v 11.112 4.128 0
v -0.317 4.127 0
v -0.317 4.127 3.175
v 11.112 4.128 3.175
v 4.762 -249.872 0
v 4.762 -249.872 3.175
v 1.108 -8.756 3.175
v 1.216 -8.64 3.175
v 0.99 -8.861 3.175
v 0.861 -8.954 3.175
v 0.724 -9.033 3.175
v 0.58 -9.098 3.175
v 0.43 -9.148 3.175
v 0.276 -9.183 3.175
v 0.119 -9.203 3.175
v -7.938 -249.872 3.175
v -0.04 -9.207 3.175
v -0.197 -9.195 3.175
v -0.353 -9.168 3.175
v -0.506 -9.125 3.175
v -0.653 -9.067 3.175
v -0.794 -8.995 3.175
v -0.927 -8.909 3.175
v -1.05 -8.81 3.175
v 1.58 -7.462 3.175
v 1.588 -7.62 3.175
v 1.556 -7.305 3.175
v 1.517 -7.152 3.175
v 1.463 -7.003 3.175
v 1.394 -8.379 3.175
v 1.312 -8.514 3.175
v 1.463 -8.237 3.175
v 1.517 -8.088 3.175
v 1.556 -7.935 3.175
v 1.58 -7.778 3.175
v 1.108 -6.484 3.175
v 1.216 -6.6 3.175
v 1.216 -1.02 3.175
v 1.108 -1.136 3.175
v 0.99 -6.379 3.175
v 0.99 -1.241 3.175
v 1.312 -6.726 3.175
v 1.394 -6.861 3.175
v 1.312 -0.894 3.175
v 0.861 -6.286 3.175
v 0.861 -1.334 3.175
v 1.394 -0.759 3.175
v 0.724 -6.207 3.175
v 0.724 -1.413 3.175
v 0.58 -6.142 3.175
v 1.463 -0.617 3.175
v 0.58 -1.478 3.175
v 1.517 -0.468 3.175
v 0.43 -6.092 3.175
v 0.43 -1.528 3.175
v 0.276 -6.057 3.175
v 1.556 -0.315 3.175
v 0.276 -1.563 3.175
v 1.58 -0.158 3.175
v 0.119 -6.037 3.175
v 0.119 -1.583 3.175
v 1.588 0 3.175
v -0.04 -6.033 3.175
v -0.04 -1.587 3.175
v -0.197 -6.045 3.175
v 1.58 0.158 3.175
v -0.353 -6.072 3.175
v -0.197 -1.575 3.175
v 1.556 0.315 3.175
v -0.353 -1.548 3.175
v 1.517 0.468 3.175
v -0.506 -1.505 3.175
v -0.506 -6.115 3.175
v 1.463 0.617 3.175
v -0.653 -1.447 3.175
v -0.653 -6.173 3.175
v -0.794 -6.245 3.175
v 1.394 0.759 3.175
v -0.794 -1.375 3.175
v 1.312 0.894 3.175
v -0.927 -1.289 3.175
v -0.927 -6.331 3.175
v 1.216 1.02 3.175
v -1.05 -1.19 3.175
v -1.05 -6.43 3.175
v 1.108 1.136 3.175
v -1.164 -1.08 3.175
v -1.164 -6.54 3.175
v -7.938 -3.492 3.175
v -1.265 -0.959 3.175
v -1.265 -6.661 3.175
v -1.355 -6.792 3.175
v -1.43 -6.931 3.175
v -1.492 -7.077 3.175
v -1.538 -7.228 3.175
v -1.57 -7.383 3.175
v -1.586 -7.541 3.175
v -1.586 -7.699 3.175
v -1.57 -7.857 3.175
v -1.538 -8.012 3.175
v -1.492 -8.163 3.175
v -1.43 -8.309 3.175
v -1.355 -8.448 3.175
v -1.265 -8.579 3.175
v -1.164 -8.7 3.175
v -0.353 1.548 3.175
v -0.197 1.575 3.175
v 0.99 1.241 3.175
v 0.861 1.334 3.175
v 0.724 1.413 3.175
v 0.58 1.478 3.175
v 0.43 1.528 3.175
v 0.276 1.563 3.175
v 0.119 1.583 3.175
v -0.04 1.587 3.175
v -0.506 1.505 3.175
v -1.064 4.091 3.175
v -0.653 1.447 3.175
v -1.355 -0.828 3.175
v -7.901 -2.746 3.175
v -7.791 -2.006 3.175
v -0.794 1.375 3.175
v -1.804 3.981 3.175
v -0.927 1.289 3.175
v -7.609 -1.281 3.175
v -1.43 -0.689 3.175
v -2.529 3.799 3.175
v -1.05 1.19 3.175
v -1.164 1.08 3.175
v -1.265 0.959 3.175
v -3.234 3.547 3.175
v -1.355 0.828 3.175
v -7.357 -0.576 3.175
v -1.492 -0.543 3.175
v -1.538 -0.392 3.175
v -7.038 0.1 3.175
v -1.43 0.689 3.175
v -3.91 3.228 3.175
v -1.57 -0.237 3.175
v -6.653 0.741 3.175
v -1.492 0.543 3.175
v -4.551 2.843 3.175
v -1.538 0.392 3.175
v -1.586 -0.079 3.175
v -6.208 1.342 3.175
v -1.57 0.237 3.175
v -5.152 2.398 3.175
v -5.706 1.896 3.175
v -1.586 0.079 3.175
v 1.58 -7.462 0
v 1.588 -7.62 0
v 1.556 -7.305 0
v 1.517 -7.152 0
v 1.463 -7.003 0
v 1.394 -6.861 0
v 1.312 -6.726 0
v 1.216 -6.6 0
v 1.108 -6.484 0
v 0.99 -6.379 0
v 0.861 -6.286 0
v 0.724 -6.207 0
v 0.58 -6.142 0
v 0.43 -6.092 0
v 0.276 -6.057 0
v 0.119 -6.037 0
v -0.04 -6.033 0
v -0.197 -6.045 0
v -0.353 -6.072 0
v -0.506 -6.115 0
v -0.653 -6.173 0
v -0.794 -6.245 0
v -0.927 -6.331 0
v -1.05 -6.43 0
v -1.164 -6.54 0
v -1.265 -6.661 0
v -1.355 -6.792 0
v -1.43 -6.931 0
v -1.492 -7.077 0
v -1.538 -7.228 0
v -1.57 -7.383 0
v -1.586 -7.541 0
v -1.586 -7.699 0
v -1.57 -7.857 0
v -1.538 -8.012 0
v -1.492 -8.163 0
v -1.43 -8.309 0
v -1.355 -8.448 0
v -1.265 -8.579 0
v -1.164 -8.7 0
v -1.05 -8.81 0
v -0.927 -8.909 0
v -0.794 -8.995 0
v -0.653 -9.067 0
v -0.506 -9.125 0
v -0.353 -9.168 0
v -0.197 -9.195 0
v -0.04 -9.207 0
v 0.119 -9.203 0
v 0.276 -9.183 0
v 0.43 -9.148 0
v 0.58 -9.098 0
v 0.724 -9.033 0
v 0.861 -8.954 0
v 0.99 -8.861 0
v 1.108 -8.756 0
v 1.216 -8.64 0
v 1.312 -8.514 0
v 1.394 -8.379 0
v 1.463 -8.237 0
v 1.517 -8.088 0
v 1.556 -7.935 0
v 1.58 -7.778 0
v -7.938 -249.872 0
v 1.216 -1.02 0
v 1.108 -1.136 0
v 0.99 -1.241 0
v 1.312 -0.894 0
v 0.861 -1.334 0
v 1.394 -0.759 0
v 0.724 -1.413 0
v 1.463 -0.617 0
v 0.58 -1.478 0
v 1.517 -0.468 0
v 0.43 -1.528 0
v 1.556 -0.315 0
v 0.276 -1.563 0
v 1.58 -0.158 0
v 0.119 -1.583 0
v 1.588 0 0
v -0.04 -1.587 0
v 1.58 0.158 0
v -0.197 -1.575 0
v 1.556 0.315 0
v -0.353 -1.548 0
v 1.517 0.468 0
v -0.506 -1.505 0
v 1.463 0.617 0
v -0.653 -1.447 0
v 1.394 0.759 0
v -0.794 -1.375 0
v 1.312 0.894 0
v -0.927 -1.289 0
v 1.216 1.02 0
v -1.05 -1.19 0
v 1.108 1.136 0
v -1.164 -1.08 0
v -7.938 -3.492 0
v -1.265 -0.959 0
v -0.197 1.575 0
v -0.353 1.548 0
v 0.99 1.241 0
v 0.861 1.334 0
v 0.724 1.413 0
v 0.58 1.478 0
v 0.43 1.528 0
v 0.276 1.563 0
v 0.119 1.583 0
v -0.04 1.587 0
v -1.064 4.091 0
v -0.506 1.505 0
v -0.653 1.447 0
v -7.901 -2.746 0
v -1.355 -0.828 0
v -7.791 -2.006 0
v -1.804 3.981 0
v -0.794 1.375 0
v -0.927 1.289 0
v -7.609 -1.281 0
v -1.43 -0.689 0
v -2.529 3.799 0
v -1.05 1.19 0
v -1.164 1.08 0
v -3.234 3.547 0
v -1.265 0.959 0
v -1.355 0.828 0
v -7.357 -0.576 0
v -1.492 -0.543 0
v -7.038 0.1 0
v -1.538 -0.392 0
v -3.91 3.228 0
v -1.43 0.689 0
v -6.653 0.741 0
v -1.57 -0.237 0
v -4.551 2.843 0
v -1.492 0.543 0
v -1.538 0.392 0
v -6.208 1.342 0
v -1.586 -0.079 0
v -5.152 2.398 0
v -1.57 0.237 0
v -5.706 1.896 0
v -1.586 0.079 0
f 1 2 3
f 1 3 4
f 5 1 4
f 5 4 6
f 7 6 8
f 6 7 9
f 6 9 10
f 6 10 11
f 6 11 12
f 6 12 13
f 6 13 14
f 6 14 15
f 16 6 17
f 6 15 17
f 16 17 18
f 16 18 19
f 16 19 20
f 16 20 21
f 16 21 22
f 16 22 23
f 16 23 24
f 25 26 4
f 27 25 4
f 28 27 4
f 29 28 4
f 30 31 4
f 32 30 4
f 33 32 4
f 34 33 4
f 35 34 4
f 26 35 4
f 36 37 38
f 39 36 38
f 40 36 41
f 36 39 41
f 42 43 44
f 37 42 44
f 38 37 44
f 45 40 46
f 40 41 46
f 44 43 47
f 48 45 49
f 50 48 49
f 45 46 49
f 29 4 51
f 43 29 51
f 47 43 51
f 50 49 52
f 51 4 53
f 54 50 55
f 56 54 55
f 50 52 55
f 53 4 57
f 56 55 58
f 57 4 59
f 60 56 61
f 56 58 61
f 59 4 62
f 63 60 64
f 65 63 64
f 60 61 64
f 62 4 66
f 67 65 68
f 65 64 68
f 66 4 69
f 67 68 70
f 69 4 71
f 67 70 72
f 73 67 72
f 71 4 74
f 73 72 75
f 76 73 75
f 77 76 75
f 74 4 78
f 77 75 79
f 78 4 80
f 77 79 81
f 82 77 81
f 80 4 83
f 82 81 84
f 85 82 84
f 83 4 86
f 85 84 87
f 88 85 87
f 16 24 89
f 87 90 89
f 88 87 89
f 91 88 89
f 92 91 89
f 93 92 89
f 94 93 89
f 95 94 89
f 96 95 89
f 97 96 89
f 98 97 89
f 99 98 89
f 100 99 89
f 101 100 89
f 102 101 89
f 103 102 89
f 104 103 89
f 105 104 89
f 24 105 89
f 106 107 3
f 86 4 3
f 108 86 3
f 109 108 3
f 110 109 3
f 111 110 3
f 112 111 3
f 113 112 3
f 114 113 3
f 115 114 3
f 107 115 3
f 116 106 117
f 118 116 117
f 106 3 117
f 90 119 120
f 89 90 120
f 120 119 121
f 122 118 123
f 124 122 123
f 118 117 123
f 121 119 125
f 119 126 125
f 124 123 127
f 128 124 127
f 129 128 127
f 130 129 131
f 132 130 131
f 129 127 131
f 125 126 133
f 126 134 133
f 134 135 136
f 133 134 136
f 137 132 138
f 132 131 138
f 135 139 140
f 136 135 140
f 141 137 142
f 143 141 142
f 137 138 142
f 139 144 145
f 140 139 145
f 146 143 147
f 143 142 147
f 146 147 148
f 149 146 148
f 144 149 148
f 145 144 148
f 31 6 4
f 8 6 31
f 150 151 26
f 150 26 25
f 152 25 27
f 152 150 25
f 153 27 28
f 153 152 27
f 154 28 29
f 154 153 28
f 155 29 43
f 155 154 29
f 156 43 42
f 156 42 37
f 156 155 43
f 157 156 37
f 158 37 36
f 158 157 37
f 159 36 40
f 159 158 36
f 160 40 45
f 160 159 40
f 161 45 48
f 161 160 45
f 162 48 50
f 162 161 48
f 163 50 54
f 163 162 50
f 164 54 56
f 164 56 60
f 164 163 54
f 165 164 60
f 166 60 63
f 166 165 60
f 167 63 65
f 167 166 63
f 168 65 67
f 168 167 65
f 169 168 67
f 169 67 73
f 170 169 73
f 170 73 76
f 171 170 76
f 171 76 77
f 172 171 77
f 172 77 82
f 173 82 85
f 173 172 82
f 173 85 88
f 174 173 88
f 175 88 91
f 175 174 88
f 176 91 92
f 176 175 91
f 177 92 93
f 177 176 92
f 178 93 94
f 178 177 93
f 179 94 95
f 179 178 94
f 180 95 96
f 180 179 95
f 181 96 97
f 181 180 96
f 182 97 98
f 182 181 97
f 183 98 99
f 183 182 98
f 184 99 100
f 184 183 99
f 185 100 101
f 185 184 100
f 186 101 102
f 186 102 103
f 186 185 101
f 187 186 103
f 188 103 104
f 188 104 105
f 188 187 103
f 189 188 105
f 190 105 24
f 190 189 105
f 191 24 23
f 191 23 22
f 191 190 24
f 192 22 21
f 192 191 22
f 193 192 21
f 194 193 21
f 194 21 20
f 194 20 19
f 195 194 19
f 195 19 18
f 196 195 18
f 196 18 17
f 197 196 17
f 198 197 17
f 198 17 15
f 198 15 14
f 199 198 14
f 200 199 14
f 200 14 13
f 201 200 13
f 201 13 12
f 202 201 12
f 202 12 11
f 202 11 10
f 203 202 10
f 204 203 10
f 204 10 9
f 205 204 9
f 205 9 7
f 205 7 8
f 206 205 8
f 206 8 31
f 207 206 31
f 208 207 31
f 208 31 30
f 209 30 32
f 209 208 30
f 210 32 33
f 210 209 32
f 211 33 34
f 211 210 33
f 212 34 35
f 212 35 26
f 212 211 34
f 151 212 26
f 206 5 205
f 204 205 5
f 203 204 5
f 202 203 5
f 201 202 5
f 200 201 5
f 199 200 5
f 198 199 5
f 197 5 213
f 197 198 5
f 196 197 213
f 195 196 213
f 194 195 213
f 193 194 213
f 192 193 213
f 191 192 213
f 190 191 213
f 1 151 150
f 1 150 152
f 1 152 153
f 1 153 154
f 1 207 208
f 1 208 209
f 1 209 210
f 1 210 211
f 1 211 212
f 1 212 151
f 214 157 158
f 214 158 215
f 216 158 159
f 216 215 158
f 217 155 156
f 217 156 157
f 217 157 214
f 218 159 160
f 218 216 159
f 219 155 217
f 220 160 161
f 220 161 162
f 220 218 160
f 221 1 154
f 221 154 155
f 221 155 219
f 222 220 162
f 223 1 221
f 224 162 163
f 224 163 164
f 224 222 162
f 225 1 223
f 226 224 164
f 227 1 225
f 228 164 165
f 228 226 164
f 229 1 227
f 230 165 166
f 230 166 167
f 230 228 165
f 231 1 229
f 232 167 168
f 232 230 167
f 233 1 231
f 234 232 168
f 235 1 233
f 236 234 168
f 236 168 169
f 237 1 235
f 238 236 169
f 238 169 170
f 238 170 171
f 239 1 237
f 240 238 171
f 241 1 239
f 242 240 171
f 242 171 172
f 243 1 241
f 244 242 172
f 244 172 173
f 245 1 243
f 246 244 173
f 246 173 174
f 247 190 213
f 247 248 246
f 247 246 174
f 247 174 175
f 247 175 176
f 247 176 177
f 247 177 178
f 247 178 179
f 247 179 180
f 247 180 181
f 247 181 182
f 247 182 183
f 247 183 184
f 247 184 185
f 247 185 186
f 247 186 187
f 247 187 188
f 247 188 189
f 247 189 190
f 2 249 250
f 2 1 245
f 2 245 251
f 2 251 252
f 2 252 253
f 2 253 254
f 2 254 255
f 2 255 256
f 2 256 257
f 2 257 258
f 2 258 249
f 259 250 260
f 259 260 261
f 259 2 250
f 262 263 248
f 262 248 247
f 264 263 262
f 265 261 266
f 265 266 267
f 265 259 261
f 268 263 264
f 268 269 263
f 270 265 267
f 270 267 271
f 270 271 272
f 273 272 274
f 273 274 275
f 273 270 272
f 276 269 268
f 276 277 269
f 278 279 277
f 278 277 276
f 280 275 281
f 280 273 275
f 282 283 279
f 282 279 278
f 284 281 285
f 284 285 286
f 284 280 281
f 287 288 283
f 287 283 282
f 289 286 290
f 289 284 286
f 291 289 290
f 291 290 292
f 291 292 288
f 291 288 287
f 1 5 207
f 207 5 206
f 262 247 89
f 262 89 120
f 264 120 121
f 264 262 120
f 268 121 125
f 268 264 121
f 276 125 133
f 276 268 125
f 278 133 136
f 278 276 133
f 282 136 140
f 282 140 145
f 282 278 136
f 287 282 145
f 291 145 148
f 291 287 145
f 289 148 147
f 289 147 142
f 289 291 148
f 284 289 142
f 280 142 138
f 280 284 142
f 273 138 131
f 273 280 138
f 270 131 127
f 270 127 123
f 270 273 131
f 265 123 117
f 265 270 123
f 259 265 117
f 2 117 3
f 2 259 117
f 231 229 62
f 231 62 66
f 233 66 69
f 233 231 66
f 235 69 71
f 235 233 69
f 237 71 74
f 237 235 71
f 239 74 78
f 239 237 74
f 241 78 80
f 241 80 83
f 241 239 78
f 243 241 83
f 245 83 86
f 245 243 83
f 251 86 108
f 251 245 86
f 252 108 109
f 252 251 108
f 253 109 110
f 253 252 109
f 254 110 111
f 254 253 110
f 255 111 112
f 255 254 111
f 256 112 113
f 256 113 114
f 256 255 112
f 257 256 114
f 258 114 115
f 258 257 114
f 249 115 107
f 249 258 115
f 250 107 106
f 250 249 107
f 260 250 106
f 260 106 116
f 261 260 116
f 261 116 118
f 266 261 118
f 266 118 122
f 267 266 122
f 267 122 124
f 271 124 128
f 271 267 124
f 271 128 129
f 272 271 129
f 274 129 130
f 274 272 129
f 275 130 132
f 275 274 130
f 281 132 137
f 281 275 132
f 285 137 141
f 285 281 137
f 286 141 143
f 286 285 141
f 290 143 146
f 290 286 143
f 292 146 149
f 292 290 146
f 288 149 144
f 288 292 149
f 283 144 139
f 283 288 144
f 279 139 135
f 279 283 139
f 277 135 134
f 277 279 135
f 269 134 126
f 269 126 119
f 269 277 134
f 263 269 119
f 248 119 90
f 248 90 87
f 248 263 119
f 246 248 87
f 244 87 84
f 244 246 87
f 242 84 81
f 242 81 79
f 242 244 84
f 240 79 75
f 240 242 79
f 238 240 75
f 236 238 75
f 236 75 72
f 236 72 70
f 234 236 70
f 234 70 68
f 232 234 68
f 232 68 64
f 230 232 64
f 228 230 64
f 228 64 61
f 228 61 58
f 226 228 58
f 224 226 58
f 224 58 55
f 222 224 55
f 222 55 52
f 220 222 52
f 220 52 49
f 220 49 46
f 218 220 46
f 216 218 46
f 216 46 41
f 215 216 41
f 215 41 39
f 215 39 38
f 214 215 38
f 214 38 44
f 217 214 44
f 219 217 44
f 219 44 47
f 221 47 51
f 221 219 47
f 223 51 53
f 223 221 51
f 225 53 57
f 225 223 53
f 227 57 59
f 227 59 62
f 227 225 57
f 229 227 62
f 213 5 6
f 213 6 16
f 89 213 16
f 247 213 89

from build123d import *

# Parameters (mm, degrees)
SKETCH1_R           = 1.5875
BOSS_EXTRUDE1_DEPTH = 3.175


with BuildPart() as part:
    # Sketch1 → Boss-Extrude1 (new body)
    with BuildSketch(Plane.XY):
        with BuildLine():
            Line((-0.3175, 4.1275), (11.1125, 4.1275))
            Line((11.1125, 4.1275), (4.7625, -249.8725))
            Line((4.7625, -249.8725), (-7.9375, -249.8725))
            Line((-7.9375, -249.8725), (-7.9375, -3.4925))
            ThreePointArc((-7.9375, -3.4925), (-5.705653673, 1.895653673), (-0.3175, 4.1275))
        make_face()
        Circle(SKETCH1_R, mode=Mode.SUBTRACT)
        with Locations((0, -7.62)):
            Circle(SKETCH1_R, mode=Mode.SUBTRACT)
    extrude(amount=BOSS_EXTRUDE1_DEPTH)


solid = part.part
